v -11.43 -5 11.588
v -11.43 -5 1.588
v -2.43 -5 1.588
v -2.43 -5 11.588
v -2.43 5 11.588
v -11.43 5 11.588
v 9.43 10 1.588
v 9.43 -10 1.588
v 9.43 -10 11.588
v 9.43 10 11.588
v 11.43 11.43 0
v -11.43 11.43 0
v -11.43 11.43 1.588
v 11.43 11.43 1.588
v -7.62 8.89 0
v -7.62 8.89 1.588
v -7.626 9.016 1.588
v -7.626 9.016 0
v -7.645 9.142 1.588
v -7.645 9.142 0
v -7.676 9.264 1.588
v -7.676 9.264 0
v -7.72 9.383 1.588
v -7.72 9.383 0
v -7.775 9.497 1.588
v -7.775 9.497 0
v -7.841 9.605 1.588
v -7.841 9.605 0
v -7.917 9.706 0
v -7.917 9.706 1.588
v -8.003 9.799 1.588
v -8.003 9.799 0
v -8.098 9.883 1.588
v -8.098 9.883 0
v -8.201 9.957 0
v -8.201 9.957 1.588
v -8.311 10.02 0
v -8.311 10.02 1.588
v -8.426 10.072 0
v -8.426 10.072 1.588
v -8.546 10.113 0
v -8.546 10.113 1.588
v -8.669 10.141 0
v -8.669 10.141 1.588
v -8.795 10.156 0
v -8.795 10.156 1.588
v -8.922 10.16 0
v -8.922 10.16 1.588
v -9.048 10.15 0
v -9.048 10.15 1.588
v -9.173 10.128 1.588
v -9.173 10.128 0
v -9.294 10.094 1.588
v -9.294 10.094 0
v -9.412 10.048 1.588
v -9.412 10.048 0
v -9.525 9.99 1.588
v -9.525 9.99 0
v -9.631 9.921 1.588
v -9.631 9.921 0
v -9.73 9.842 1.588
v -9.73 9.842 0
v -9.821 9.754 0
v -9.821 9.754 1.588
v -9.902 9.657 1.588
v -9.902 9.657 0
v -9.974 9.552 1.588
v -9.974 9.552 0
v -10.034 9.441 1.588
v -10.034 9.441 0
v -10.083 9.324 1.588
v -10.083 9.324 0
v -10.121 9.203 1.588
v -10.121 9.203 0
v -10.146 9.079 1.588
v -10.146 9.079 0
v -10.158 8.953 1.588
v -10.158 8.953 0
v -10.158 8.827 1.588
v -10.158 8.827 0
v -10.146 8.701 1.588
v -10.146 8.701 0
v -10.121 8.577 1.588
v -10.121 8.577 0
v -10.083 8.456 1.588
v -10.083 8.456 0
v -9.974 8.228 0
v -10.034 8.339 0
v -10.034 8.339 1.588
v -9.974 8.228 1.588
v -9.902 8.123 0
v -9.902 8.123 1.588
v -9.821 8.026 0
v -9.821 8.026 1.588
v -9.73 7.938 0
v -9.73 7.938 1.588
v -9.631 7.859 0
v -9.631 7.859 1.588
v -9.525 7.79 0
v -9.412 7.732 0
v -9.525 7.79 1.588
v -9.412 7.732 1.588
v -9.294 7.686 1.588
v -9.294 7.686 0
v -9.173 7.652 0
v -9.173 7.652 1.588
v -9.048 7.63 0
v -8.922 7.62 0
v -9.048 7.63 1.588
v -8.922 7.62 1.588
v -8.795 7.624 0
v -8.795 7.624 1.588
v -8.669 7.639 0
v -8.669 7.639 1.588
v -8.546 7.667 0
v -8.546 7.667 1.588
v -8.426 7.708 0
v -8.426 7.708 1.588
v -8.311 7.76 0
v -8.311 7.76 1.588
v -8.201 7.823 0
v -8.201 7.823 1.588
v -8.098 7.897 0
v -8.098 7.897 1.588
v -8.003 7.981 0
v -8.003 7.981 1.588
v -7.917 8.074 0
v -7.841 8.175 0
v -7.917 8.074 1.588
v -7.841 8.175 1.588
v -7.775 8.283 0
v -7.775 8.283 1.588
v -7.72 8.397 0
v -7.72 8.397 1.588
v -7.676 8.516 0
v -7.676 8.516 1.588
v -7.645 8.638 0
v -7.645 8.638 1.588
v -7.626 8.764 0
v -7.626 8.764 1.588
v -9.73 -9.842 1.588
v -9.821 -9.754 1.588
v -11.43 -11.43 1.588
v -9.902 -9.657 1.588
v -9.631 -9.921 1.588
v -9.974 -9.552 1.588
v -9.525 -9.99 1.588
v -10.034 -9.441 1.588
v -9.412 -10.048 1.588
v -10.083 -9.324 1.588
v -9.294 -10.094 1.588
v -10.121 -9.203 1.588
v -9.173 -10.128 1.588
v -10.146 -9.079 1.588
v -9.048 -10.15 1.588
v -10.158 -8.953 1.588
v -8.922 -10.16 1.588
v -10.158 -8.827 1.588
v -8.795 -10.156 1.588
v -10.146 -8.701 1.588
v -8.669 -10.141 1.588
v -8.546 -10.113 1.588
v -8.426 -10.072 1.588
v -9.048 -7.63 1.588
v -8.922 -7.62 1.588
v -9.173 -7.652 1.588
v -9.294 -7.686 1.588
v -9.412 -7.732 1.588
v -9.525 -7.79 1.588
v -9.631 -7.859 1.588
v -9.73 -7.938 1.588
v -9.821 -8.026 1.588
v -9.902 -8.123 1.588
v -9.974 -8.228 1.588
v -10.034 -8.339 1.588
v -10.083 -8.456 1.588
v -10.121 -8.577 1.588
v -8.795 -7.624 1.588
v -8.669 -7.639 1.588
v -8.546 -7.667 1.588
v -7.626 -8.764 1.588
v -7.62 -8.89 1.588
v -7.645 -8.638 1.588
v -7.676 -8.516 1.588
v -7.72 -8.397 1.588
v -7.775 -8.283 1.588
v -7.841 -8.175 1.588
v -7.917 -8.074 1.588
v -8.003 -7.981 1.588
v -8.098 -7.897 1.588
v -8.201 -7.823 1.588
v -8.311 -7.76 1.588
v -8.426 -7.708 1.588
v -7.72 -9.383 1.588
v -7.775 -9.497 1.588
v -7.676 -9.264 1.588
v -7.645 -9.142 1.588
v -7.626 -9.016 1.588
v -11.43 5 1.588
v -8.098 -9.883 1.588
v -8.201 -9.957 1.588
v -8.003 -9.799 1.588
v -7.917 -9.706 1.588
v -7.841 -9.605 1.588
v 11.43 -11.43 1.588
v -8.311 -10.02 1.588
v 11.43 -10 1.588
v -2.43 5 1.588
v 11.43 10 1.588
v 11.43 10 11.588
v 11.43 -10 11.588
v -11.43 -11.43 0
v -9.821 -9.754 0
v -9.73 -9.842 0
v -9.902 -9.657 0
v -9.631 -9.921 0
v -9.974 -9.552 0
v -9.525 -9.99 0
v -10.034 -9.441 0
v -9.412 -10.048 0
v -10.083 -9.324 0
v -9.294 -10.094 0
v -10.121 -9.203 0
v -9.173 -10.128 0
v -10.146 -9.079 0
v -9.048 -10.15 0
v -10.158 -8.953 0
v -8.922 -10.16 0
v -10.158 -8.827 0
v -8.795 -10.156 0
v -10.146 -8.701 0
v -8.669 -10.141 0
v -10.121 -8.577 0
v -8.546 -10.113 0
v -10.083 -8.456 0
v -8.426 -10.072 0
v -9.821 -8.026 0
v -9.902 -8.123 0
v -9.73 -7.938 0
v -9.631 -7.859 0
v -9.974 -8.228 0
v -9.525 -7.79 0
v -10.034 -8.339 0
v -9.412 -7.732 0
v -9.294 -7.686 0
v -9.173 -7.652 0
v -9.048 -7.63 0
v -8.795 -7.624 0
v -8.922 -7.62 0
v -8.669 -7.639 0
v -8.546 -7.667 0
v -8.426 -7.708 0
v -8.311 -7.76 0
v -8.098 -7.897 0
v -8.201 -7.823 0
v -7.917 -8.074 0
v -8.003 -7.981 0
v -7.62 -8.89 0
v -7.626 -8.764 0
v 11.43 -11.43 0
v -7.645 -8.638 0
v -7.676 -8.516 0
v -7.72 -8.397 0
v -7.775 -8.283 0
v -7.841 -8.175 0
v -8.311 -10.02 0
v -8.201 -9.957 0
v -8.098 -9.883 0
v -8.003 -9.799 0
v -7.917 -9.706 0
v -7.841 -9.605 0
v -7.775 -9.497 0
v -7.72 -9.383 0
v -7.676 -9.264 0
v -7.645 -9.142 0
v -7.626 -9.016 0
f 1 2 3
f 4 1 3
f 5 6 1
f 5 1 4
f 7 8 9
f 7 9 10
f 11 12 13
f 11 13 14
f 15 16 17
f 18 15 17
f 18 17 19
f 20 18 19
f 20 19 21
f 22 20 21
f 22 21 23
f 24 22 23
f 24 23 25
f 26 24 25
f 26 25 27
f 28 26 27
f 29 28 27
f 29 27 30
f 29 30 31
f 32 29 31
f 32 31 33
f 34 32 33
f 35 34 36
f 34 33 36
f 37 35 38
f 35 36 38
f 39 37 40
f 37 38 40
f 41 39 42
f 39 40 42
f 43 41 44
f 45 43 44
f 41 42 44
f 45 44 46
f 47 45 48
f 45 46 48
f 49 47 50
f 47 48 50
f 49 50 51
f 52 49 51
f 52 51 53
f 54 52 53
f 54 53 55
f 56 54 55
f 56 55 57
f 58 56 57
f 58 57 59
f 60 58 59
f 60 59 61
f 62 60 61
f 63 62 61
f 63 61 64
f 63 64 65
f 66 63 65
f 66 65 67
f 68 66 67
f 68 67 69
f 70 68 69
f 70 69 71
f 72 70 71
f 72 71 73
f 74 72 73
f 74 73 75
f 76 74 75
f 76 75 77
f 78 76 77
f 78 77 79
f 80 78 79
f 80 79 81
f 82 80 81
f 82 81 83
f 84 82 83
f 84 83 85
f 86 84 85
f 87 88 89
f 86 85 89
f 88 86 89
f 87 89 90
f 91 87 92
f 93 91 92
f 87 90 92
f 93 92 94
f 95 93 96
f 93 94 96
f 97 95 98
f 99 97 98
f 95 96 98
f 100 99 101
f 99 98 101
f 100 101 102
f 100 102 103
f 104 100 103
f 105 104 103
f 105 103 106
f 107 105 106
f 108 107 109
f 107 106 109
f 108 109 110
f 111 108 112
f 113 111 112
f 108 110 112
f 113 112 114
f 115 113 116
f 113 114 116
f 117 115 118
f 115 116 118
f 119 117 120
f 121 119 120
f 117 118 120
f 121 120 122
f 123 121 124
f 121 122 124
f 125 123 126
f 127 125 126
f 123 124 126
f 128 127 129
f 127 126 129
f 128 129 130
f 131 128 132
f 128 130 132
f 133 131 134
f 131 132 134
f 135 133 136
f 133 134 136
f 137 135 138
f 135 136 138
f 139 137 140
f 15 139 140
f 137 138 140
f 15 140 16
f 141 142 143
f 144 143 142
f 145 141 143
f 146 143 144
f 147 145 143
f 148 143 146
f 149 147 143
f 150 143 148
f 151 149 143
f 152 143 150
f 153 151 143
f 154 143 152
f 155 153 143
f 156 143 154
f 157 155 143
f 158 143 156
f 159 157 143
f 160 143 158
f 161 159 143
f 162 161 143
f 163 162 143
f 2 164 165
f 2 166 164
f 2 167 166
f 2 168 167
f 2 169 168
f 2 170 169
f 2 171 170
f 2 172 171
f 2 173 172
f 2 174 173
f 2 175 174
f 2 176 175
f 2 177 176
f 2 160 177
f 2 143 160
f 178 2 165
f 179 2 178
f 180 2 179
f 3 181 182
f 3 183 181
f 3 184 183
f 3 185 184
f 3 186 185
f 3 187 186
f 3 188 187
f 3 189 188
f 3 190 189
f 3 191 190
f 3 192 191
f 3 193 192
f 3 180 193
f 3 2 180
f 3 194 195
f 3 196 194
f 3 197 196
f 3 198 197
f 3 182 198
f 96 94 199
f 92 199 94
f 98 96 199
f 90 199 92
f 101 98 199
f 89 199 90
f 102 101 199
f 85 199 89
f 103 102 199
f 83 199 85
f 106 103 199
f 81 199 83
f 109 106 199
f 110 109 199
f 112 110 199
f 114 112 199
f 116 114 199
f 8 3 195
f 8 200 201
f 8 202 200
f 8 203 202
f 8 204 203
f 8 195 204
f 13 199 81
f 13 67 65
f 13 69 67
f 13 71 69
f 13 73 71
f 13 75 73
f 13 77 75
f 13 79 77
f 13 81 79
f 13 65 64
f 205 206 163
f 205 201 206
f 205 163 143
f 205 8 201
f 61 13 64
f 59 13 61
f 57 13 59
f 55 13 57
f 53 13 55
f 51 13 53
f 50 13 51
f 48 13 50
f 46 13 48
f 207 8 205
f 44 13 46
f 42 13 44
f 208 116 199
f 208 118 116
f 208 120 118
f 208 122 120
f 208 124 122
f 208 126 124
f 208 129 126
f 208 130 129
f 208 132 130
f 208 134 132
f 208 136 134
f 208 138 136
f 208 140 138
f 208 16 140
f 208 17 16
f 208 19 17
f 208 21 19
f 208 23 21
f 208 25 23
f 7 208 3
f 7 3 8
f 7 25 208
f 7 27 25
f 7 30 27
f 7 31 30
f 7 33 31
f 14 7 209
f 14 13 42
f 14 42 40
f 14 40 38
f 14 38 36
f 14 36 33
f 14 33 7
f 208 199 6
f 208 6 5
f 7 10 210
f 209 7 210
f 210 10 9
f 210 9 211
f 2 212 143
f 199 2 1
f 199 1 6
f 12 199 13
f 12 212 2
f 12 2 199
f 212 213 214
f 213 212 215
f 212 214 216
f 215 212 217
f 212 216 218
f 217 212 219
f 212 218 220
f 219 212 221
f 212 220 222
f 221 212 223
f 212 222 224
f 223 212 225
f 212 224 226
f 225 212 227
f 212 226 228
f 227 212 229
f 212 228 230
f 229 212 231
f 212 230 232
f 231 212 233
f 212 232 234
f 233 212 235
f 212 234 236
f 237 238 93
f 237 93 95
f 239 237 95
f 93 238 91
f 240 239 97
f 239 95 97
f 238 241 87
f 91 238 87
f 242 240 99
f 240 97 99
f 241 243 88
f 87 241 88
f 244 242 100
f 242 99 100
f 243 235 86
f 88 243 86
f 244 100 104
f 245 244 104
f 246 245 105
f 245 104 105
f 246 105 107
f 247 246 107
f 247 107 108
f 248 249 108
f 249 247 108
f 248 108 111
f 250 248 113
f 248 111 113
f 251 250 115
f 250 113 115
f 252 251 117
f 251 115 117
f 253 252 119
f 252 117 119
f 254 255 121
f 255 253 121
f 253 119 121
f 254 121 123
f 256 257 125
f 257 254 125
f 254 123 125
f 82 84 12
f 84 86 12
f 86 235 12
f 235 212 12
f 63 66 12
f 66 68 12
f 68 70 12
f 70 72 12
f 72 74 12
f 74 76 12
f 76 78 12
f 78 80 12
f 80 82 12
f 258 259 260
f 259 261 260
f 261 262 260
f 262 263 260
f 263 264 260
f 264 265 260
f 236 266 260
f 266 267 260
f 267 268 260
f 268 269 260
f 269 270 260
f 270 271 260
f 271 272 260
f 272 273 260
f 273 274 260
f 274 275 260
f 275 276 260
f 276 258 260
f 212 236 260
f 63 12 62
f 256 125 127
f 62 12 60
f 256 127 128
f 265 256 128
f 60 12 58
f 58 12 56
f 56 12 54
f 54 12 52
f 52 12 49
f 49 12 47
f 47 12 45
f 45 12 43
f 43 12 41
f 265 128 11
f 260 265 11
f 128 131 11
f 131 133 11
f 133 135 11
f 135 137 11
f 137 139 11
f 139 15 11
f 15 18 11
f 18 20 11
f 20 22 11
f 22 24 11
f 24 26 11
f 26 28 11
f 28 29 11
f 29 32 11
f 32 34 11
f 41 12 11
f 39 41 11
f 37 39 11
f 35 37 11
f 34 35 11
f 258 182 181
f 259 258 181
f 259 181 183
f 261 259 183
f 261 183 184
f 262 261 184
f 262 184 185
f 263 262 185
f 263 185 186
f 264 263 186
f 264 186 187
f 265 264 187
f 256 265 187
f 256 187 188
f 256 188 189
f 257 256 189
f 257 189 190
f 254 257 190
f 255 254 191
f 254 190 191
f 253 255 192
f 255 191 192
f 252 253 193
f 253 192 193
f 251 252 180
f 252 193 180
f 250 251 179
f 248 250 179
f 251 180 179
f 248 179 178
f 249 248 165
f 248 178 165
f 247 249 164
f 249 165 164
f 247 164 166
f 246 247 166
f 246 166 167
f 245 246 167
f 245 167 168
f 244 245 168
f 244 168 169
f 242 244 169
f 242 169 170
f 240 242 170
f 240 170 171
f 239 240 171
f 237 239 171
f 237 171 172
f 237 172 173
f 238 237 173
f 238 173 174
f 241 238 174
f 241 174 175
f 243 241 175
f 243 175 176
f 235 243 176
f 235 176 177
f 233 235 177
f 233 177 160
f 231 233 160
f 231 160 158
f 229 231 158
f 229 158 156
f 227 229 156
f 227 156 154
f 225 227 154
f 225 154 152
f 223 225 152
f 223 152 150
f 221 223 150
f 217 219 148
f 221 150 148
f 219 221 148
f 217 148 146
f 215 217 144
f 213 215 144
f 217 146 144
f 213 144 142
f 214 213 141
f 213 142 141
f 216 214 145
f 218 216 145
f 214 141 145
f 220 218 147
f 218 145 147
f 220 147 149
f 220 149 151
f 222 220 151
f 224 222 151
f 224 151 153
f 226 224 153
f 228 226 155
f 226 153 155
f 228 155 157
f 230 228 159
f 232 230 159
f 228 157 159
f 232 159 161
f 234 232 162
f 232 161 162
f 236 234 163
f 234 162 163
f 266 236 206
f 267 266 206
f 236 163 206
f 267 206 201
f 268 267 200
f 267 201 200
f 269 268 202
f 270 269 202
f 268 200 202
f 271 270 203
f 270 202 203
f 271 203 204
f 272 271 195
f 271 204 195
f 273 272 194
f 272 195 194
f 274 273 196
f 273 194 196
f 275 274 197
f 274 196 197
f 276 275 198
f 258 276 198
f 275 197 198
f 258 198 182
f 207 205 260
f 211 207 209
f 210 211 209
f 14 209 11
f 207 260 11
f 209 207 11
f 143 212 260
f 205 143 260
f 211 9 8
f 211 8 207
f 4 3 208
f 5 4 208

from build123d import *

# Parameters (mm, degrees)
SKETCH1_W           = 22.86
SKETCH1_H           = 22.86
BOSS_EXTRUDE1_DEPTH = 1.5875
SKETCH2_W           = 9
SKETCH2_H           = 10
BOSS_EXTRUDE2_DEPTH = 10
SKETCH4_W           = 2
SKETCH4_H           = 20
BOSS_EXTRUDE3_DEPTH = 10
SKETCH6_R           = 1.27
CUT_EXTRUDE1_DEPTH  = 20.007624786


with BuildPart() as part:
    # Sketch1 → Boss-Extrude1 (new body)
    with BuildSketch(Plane.XY):
        Rectangle(SKETCH1_W, SKETCH1_H)
    extrude(amount=BOSS_EXTRUDE1_DEPTH)

    # Sketch2 → Boss-Extrude2 (add)
    with BuildSketch(Plane.XY.offset(1.5875)):
        with Locations((-6.93, 0)):
            Rectangle(SKETCH2_W, SKETCH2_H)
    extrude(amount=BOSS_EXTRUDE2_DEPTH)

    # Sketch4 → Boss-Extrude3 (add)
    with BuildSketch(Plane.XY.offset(1.5875)):
        with Locations((10.43, 0)):
            Rectangle(SKETCH4_W, SKETCH4_H)
    extrude(amount=BOSS_EXTRUDE3_DEPTH)

    # Sketch6 → Cut-Extrude1 (cut, through all)
    with BuildSketch(Plane.XY.offset(1.5875)):
        with Locations((-8.89, 8.89)):
            Circle(SKETCH6_R)
        with Locations((-8.89, -8.89)):
            Circle(SKETCH6_R)
    extrude(amount=-CUT_EXTRUDE1_DEPTH, mode=Mode.SUBTRACT)


solid = part.part
